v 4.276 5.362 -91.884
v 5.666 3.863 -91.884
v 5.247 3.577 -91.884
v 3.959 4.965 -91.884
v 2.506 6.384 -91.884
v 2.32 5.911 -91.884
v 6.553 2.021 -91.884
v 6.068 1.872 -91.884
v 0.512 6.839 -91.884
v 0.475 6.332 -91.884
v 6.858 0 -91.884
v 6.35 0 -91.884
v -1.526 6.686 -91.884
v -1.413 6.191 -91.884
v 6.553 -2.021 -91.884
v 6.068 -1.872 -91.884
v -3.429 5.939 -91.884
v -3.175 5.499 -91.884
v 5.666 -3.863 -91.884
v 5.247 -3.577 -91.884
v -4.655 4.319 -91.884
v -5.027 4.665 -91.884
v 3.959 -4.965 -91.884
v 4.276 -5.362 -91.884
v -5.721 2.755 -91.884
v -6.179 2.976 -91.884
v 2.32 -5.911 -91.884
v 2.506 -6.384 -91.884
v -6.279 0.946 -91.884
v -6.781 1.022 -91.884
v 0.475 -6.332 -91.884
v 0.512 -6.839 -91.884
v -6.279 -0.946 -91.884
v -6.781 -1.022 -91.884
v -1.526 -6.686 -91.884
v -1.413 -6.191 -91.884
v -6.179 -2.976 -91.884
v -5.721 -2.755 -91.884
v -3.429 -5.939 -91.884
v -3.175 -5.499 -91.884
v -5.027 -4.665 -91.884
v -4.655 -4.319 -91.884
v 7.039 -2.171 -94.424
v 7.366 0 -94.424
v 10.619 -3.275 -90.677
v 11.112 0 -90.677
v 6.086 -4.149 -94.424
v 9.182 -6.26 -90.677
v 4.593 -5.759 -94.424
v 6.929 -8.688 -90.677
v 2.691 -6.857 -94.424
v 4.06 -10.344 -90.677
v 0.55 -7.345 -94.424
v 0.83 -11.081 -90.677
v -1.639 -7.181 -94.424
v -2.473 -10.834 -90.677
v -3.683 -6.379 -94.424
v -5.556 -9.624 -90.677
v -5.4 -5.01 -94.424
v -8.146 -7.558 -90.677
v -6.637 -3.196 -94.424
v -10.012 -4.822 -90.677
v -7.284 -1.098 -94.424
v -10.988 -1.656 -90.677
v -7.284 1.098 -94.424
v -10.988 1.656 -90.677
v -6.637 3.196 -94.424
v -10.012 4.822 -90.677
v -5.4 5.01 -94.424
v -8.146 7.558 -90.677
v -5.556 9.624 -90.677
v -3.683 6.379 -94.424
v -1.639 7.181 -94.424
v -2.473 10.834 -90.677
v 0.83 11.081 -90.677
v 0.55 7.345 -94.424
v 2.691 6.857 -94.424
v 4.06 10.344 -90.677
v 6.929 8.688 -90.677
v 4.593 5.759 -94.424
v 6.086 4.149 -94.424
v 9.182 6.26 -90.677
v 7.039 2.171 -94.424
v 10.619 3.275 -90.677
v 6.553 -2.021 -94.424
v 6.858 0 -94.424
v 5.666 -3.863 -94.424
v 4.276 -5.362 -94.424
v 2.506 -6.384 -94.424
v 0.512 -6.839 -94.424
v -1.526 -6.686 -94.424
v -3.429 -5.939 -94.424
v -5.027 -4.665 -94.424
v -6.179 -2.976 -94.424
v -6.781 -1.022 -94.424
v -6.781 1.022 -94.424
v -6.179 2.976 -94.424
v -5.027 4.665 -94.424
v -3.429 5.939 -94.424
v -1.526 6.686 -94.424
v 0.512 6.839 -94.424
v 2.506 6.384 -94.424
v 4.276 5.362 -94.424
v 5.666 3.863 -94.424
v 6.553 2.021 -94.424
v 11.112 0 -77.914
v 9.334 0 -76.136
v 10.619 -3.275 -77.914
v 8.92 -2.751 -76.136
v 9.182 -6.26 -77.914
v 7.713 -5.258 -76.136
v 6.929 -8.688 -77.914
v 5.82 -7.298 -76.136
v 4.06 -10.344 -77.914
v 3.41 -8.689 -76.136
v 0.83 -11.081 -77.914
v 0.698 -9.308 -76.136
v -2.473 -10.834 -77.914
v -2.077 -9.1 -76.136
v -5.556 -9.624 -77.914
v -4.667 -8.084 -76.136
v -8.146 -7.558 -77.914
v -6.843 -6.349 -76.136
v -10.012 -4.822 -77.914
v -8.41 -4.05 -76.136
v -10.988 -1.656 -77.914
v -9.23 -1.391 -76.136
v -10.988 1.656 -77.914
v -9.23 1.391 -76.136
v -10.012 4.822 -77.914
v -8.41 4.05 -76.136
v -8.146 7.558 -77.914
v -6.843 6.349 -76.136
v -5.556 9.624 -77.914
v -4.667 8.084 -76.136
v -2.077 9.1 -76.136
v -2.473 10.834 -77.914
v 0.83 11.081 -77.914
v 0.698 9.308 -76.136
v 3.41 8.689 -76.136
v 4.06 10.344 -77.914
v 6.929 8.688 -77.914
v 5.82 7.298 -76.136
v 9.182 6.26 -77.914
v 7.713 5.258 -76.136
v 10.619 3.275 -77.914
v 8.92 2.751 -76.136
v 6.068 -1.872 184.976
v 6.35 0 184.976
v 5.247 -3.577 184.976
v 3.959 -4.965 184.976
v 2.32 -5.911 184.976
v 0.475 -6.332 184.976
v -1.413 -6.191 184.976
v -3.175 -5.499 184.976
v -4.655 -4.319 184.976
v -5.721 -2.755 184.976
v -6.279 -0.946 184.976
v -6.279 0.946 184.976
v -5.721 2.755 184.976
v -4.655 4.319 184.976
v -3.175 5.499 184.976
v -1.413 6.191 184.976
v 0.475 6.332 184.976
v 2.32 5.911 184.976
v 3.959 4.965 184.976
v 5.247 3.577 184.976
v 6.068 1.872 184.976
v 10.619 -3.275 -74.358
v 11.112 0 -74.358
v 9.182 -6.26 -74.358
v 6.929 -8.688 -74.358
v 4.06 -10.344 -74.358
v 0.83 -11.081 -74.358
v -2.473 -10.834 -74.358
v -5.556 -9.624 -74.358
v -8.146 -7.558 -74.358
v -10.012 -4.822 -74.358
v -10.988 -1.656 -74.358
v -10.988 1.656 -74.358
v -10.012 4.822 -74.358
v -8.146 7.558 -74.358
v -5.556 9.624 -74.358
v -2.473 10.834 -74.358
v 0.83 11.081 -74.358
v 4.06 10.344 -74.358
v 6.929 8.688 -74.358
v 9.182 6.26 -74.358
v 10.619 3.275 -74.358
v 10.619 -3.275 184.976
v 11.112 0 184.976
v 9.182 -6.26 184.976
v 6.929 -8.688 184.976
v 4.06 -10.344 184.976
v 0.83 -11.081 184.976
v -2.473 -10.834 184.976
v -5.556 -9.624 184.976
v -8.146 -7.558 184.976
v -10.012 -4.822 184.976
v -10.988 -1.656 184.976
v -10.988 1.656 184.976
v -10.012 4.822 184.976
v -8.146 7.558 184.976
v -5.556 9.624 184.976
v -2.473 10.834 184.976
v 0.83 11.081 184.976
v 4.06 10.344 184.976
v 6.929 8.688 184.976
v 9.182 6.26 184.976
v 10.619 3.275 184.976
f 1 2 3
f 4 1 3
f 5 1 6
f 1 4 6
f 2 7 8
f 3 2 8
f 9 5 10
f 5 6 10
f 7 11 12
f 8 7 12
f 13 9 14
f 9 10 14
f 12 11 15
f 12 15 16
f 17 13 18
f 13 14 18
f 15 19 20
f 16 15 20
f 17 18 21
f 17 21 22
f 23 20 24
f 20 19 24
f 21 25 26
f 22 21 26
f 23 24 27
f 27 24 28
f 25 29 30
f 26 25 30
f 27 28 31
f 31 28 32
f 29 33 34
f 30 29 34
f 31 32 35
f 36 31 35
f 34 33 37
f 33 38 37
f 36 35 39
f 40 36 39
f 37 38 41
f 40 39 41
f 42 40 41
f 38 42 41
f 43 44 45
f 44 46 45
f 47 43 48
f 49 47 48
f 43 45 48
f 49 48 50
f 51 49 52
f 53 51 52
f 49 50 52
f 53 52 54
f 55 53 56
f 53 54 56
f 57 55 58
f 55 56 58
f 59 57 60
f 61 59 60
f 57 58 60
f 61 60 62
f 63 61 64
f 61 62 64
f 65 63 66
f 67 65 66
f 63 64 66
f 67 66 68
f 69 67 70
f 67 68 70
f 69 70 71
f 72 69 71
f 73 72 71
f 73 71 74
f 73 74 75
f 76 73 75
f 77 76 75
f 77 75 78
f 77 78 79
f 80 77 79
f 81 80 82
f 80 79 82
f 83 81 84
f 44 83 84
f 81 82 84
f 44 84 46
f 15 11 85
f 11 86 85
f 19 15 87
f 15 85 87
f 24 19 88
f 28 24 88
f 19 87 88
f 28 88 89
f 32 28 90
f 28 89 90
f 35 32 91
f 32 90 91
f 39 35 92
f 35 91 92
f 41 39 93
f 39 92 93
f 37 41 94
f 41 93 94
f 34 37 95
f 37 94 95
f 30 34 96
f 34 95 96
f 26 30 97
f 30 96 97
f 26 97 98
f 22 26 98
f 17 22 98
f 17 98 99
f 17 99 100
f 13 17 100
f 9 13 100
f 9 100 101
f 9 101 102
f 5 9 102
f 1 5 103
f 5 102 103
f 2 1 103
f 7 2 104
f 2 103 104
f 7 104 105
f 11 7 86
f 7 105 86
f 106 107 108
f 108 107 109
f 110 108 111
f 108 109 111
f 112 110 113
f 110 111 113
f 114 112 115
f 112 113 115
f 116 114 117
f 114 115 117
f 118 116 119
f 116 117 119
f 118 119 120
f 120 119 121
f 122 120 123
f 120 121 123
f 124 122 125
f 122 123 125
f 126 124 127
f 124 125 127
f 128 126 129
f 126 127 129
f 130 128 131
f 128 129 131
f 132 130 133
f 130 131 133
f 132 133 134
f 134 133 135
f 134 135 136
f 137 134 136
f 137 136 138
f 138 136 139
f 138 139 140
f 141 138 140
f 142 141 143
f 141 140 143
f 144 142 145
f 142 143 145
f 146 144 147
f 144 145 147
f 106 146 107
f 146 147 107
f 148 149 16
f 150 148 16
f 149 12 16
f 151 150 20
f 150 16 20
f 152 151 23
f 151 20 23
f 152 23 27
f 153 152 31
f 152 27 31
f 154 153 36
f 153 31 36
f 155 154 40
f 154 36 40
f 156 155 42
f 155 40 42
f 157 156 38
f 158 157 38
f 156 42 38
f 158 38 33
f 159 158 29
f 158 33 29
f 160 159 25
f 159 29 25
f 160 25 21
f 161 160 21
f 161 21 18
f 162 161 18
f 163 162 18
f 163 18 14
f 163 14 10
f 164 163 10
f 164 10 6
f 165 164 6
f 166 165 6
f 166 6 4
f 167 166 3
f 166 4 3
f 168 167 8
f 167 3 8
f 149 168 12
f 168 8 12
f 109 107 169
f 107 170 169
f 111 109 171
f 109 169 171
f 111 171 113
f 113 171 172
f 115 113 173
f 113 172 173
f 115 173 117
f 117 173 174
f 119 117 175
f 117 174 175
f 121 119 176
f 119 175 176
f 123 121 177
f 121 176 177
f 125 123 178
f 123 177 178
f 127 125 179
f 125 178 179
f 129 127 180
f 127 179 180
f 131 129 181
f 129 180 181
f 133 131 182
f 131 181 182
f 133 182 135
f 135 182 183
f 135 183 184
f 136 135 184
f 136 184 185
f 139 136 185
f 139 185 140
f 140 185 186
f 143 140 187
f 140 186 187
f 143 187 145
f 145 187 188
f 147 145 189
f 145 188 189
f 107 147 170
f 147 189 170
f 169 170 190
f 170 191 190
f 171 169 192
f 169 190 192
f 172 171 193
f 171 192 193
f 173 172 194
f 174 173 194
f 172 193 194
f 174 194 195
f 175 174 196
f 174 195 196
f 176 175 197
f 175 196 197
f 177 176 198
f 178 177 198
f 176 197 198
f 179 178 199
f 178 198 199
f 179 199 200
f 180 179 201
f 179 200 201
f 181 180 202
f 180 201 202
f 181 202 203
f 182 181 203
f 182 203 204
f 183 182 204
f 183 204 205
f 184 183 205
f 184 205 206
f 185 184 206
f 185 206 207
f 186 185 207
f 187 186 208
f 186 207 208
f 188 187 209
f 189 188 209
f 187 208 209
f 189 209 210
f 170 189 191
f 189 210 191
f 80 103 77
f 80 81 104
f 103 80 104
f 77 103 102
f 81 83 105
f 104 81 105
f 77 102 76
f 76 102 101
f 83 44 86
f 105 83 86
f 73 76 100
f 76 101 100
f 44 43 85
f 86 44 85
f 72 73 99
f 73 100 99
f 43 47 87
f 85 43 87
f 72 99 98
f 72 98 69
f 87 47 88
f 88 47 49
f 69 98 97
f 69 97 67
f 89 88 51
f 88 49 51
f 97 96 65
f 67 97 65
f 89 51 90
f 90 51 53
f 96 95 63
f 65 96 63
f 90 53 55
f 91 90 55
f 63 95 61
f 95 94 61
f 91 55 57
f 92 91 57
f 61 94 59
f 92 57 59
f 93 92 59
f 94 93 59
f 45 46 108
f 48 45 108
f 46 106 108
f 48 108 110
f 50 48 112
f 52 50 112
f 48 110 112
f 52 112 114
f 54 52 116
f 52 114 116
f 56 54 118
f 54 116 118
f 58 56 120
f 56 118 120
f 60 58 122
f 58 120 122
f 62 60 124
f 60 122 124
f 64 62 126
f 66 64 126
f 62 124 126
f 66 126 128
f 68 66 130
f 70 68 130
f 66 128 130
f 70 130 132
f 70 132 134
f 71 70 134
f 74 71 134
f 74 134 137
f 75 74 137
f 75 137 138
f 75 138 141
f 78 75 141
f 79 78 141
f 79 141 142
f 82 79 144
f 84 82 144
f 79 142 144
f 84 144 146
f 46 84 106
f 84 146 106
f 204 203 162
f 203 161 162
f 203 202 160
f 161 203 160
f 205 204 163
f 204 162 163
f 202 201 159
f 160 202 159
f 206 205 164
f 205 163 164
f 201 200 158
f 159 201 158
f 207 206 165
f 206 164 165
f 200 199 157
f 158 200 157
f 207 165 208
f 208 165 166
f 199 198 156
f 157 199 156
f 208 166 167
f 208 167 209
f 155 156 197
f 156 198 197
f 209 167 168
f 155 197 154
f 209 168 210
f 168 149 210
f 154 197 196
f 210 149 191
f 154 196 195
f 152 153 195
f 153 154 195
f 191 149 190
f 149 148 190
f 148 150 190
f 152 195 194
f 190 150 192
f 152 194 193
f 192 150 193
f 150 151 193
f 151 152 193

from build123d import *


with BuildPart() as part:
    # Sketch1 → Revolve1 (revolve)
    with BuildSketch(Plane(origin=(0, 0, 0), x_dir=(0, 0, -1), z_dir=(1, 0, 0)), mode=Mode.PRIVATE) as revolve1_sk:
        Polygon((-184.976381406, 6.35), (91.883618594, 6.35), (91.883618594, 6.858), (94.423618594, 6.858), (94.423618594, 7.366), (90.677118594, 11.1125), (77.913618594, 11.1125), (76.135618594, 9.3345), (74.357618594, 11.1125), (-184.976381406, 11.1125), align=None)
    revolve(revolve1_sk.sketch.rotate(Axis((0, 0, 90.130122331), (0, 0, -1)), 90), axis=Axis((0, 0, 90.130122331), (0, 0, -1)))  # turned: the seam where the file's is


solid = part.part
